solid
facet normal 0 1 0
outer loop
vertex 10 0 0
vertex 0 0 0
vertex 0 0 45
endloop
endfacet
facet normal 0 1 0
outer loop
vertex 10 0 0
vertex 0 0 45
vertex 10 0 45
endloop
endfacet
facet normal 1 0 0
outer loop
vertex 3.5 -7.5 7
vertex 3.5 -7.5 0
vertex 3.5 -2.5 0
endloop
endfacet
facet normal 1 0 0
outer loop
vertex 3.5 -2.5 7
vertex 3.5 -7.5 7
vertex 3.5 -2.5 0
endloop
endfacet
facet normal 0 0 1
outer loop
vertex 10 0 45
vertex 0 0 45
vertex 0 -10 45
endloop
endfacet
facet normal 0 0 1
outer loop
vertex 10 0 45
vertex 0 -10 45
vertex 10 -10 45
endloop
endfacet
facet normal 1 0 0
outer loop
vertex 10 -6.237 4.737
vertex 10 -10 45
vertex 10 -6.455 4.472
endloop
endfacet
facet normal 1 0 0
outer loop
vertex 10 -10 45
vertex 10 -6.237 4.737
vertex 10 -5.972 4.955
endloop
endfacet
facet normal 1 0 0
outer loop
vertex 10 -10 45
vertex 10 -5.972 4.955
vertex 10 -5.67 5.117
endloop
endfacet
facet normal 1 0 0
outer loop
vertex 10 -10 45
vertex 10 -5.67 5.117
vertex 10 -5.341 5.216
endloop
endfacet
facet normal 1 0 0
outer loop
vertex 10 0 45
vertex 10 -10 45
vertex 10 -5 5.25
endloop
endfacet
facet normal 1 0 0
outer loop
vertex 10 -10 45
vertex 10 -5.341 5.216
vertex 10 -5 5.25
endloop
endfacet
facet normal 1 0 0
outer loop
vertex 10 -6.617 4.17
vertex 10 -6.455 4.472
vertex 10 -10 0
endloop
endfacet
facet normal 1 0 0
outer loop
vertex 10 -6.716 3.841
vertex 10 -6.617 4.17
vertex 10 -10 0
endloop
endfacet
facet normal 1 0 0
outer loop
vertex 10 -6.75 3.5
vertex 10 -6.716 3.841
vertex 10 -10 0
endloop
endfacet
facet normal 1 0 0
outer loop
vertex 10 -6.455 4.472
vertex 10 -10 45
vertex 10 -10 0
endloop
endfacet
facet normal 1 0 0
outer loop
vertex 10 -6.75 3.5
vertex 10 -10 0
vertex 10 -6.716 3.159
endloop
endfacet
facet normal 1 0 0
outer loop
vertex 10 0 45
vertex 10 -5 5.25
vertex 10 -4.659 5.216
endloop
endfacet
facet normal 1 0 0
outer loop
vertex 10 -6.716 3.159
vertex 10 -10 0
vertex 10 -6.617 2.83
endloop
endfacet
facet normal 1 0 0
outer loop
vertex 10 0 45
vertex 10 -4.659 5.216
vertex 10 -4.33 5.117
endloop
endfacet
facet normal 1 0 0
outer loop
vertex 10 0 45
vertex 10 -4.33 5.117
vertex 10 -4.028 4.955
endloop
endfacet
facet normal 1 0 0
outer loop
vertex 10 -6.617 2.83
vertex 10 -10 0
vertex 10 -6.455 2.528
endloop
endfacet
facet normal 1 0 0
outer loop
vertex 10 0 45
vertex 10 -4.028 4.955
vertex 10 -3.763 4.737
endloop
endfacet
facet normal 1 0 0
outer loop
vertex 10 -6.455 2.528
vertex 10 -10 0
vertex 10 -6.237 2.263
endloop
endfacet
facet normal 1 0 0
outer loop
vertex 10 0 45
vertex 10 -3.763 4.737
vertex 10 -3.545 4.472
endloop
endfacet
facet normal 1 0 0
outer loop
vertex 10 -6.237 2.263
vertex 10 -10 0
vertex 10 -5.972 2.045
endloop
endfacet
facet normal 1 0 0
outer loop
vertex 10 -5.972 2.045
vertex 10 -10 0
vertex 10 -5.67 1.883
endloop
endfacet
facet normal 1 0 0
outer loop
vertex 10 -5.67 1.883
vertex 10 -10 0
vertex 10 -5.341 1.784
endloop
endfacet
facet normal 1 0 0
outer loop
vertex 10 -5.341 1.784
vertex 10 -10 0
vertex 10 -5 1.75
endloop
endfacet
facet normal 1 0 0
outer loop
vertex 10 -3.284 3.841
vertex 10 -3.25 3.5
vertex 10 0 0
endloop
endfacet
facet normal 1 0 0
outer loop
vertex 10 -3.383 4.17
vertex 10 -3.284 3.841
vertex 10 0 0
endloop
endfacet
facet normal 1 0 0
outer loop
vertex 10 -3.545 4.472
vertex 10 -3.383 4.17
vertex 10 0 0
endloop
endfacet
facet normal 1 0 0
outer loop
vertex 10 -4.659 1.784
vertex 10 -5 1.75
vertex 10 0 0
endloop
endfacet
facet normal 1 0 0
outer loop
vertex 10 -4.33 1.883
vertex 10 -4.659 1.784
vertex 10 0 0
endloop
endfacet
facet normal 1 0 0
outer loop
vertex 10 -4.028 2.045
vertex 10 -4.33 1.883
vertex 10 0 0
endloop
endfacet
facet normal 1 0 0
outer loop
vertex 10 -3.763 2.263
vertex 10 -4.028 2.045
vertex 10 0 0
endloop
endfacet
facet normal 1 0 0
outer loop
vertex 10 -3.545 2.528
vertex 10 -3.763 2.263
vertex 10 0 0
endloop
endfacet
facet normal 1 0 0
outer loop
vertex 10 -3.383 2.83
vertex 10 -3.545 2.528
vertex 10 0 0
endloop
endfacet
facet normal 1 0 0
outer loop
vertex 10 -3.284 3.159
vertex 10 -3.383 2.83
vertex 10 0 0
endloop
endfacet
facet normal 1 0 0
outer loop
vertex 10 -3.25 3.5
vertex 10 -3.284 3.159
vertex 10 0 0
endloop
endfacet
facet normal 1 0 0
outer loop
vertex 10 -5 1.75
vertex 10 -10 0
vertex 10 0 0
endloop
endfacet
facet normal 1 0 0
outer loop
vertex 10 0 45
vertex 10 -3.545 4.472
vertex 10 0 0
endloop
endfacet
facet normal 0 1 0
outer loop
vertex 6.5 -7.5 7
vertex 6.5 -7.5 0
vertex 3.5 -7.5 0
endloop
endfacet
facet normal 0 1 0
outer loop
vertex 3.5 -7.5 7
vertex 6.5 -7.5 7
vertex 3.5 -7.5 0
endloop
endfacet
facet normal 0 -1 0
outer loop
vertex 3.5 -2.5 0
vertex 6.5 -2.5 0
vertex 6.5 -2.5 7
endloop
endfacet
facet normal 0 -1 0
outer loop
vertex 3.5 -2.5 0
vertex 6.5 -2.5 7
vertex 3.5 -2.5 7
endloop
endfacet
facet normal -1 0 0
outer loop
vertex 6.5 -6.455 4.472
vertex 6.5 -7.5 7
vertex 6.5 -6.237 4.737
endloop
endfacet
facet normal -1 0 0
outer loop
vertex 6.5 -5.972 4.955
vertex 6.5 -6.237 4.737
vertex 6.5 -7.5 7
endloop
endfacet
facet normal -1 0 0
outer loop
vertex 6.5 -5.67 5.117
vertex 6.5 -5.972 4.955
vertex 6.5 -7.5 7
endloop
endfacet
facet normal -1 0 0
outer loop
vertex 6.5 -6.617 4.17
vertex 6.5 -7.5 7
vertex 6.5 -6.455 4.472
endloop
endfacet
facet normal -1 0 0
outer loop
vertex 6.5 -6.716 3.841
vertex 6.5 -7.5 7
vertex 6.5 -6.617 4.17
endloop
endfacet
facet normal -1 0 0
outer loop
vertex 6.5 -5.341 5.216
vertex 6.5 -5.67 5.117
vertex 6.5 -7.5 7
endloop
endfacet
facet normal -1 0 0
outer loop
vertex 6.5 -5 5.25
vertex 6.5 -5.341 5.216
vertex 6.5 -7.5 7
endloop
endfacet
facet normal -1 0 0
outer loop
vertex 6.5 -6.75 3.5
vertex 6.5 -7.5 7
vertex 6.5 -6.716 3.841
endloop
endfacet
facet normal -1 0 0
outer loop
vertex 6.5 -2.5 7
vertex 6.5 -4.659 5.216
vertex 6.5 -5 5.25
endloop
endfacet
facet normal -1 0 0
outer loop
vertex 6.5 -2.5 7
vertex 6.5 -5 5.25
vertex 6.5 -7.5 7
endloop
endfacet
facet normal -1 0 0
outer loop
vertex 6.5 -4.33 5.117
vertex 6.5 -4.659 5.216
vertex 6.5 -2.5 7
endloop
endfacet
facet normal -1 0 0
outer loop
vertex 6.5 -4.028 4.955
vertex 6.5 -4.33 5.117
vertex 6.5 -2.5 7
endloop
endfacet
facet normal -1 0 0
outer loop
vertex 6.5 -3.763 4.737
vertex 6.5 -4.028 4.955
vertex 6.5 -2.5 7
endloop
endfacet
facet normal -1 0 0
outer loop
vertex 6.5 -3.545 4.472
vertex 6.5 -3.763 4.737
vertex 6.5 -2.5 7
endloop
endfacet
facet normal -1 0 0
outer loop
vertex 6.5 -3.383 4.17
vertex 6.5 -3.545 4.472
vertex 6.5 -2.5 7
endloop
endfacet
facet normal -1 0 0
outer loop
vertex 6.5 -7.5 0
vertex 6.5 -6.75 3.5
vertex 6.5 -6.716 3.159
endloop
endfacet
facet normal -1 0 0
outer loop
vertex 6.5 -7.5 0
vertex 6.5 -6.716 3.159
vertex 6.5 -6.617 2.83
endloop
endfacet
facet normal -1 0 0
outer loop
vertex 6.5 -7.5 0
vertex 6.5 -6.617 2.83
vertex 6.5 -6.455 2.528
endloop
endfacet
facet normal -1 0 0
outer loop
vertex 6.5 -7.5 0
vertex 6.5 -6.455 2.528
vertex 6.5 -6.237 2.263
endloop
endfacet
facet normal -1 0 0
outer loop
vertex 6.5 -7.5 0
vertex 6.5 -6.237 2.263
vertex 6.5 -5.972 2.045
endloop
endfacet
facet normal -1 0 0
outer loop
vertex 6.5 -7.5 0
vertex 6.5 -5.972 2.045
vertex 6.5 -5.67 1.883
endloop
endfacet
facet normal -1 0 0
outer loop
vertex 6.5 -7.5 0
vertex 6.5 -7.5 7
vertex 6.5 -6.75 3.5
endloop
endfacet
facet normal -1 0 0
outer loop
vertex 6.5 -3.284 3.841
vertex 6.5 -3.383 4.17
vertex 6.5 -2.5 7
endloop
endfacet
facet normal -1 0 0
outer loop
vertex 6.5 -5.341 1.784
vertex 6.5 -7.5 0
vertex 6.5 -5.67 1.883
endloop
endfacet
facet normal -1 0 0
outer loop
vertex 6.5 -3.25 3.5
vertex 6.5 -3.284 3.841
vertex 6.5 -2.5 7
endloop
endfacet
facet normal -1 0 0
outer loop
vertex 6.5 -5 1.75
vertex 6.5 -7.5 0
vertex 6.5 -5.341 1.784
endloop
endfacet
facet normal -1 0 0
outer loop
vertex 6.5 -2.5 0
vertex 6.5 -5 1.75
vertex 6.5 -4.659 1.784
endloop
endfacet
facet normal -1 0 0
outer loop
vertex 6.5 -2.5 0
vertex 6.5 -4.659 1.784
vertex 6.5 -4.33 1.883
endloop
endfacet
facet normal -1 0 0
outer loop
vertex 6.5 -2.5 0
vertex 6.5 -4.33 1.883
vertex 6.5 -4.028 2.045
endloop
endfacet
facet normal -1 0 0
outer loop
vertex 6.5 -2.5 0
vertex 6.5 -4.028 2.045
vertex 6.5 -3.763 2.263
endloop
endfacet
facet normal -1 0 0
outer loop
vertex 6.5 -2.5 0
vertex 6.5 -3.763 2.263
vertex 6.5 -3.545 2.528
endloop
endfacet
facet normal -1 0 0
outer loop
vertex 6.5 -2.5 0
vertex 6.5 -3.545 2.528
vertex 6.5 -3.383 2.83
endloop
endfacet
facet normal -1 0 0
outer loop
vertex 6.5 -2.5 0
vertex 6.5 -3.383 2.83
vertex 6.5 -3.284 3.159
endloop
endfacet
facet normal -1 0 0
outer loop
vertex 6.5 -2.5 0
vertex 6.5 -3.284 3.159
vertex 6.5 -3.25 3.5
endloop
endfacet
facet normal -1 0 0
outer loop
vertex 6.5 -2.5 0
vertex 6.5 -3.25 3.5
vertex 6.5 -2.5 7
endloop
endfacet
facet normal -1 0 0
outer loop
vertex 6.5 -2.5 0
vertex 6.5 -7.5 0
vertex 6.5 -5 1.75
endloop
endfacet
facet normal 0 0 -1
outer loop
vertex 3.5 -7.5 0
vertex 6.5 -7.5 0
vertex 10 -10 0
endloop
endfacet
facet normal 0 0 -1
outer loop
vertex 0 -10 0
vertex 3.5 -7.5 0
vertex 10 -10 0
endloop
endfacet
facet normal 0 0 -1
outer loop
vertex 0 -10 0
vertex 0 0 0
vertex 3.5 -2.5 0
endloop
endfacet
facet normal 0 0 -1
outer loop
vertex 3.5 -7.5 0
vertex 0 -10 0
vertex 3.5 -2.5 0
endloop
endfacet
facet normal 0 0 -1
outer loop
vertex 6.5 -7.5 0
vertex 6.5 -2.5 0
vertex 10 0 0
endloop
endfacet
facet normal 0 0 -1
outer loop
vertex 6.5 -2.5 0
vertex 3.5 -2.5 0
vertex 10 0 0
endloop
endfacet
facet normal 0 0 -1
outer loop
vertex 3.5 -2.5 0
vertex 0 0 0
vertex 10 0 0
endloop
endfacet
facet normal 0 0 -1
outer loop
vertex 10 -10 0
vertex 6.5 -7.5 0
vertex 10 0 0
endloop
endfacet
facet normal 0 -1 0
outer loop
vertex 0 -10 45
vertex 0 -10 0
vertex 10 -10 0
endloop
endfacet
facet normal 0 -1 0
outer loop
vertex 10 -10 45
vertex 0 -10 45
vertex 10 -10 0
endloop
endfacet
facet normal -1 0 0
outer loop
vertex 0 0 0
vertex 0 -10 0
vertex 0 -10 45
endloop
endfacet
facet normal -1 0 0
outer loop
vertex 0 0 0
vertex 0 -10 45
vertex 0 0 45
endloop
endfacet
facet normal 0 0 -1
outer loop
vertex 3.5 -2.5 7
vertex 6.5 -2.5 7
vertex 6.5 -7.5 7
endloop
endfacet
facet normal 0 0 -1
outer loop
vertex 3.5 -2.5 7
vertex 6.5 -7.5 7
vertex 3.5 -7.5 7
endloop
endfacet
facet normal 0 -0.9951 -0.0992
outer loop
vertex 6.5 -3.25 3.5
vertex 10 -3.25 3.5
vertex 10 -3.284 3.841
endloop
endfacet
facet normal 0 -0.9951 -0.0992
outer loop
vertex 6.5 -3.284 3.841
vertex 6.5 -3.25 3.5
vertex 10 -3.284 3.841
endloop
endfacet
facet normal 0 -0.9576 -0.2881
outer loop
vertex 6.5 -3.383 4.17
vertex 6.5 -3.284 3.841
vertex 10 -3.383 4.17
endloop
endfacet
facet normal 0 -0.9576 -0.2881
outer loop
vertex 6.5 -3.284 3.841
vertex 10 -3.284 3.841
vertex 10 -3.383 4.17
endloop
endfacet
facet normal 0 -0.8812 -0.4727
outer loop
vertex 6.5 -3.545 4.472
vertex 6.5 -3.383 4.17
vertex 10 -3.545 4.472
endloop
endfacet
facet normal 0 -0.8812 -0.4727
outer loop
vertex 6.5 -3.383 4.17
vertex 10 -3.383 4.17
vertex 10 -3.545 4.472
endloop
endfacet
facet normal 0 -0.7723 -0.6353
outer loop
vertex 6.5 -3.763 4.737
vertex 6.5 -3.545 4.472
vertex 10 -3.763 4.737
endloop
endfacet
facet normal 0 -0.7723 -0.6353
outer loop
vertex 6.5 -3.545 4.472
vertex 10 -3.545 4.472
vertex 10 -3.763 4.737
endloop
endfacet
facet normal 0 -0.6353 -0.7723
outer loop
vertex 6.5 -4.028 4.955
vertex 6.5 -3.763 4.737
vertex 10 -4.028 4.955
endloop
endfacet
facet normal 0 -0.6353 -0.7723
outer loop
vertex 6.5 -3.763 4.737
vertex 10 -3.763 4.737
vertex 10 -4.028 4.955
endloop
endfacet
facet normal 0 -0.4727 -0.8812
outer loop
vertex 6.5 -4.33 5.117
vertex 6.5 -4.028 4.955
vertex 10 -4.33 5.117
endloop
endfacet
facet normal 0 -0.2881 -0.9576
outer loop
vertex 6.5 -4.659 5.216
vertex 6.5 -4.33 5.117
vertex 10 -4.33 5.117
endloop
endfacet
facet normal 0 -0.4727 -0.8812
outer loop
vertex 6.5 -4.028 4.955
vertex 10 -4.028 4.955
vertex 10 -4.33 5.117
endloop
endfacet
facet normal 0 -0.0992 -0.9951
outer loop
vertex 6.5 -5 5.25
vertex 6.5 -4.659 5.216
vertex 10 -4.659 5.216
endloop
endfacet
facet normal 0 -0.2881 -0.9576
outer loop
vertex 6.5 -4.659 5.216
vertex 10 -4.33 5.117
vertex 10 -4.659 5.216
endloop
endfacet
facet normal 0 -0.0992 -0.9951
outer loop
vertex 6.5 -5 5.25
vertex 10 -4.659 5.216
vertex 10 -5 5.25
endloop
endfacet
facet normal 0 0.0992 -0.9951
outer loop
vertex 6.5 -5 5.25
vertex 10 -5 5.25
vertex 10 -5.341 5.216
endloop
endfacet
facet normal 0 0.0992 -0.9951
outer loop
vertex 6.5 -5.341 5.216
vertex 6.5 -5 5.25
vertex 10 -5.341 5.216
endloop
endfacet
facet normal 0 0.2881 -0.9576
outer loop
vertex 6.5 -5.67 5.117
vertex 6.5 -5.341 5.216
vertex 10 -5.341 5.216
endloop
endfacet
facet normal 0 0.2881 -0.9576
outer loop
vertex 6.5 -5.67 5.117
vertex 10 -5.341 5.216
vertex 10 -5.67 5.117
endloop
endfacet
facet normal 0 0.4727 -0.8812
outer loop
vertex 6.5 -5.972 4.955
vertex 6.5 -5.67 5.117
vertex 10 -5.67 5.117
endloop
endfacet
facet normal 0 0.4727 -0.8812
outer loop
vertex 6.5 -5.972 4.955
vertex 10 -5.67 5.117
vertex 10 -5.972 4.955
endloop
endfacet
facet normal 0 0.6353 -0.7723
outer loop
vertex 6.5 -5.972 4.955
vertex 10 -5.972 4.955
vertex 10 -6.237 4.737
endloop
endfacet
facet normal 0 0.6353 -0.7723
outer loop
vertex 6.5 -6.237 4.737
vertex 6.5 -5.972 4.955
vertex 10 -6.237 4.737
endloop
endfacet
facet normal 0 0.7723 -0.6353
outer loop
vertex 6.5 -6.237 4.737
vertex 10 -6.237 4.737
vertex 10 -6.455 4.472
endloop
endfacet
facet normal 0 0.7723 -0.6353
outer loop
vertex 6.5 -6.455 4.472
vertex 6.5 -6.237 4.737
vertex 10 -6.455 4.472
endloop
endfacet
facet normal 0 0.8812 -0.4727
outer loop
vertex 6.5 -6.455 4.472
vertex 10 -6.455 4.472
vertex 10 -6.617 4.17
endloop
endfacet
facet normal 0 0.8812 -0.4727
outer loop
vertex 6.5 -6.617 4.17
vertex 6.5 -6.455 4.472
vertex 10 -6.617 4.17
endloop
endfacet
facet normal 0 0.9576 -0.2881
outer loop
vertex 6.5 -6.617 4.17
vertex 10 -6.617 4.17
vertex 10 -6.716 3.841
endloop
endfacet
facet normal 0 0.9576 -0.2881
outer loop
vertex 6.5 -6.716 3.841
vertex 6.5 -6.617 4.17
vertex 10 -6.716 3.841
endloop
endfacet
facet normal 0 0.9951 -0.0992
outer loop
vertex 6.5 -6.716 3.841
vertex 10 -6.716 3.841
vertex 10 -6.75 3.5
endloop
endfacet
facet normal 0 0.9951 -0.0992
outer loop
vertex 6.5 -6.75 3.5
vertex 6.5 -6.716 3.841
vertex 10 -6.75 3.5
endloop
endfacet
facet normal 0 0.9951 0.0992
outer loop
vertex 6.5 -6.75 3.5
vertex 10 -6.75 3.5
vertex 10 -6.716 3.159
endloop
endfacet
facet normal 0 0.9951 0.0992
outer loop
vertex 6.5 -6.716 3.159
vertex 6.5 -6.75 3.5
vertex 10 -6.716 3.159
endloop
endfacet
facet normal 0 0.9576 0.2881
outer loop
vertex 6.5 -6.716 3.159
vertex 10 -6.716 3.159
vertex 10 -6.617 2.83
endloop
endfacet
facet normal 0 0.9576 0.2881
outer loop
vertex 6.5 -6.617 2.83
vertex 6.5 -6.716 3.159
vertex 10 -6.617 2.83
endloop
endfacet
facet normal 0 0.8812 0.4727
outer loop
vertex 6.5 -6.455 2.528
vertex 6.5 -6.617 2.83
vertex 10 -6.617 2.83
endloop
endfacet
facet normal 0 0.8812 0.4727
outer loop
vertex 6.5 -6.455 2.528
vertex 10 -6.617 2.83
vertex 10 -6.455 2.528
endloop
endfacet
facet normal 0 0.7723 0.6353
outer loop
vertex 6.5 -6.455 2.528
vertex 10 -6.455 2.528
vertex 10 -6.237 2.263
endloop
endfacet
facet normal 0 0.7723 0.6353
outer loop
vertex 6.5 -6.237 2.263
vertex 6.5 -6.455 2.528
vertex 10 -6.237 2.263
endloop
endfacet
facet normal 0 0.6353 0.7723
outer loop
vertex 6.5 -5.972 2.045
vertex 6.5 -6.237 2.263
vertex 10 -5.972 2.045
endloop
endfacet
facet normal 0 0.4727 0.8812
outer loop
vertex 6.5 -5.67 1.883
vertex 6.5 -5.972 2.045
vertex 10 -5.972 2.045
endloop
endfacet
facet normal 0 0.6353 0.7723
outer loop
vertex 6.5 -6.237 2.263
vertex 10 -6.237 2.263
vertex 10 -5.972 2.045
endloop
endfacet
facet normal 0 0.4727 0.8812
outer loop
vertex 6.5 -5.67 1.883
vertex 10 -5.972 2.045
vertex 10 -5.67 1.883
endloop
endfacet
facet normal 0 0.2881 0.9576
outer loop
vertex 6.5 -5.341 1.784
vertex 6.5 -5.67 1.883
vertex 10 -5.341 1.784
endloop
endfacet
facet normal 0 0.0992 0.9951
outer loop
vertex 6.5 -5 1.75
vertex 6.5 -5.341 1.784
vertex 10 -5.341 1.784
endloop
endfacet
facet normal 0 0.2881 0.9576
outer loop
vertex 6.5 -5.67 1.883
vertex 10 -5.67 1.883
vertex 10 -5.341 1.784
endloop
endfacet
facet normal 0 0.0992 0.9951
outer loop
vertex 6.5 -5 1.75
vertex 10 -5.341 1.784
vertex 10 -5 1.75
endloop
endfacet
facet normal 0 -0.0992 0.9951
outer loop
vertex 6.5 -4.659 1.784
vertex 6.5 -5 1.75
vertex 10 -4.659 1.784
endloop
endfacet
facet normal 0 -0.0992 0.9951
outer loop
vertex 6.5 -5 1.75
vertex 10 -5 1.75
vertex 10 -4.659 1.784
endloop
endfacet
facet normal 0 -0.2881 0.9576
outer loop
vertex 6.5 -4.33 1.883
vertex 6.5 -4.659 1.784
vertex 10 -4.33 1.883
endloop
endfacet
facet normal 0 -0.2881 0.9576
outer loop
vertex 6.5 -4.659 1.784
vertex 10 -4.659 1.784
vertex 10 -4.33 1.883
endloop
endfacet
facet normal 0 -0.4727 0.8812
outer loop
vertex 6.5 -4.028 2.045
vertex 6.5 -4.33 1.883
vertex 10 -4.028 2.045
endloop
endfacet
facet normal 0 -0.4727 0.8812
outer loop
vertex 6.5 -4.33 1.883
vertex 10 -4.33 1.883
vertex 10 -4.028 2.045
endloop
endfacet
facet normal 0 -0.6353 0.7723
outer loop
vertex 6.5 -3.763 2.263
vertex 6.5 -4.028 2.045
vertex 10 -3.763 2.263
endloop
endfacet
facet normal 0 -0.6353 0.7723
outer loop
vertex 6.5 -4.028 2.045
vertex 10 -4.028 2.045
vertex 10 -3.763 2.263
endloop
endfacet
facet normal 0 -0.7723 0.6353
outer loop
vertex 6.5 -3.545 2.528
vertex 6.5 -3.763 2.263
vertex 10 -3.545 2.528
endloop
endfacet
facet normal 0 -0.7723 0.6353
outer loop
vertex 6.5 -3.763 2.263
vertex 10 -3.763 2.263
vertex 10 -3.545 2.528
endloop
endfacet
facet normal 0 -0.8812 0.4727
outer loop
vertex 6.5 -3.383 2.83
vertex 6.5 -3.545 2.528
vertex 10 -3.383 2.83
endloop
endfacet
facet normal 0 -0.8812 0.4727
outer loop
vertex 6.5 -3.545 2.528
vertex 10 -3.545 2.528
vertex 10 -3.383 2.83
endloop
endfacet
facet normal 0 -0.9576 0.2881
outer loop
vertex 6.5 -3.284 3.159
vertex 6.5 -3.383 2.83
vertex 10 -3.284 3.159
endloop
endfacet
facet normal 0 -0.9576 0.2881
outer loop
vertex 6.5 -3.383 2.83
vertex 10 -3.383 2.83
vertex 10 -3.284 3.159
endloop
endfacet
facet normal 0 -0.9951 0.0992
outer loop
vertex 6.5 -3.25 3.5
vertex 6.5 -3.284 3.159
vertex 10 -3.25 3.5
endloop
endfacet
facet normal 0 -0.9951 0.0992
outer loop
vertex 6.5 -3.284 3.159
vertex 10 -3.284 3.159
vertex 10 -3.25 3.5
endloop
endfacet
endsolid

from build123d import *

# Parameters (mm, degrees)
SKETCH_1_W          = 10
SKETCH_1_H          = 10
EXTRUDE_1_DEPTH     = 45
SKETCH_2_W          = 3
SKETCH_2_H          = 5
CUT_EXTRUDE_1_DEPTH = 7
CUT_EXTRUDE_2_REACH = 49.17
SKETCH_3_R          = 1.75


with BuildPart() as part:
    # 草图1 → 凸台-拉伸1 (new body)
    with BuildSketch(Plane.XY):
        with Locations((5, -5)):
            Rectangle(SKETCH_1_W, SKETCH_1_H)
    extrude(amount=EXTRUDE_1_DEPTH)

    # 草图2 → 切除-拉伸1 (cut)
    with BuildSketch(Plane(origin=(0, 0, 0), x_dir=(-1, 0, 0), z_dir=(0, 0, -1))):
        with Locations((-5, -5)):
            Rectangle(SKETCH_2_W, SKETCH_2_H)
    extrude(amount=-CUT_EXTRUDE_1_DEPTH, mode=Mode.SUBTRACT)

    # 草图3 → 切除-拉伸2 (cut, up to next)
    with BuildSketch(Plane(origin=(10, 0, 0), x_dir=(0, 0, -1), z_dir=(1, 0, 0)), mode=Mode.PRIVATE) as cut_extrude_2_sk1:
        with Locations(Location((-3.5, -5, 0), (0, 0, 90))):
            Circle(SKETCH_3_R)
    cut_extrude_2_tool1 = extrude(cut_extrude_2_sk1.sketch, amount=-CUT_EXTRUDE_2_REACH, mode=Mode.PRIVATE) & part.part
    add(cut_extrude_2_tool1.solids().sort_by_distance((10, -5, 3.5))[0], mode=Mode.SUBTRACT)


solid = part.part
